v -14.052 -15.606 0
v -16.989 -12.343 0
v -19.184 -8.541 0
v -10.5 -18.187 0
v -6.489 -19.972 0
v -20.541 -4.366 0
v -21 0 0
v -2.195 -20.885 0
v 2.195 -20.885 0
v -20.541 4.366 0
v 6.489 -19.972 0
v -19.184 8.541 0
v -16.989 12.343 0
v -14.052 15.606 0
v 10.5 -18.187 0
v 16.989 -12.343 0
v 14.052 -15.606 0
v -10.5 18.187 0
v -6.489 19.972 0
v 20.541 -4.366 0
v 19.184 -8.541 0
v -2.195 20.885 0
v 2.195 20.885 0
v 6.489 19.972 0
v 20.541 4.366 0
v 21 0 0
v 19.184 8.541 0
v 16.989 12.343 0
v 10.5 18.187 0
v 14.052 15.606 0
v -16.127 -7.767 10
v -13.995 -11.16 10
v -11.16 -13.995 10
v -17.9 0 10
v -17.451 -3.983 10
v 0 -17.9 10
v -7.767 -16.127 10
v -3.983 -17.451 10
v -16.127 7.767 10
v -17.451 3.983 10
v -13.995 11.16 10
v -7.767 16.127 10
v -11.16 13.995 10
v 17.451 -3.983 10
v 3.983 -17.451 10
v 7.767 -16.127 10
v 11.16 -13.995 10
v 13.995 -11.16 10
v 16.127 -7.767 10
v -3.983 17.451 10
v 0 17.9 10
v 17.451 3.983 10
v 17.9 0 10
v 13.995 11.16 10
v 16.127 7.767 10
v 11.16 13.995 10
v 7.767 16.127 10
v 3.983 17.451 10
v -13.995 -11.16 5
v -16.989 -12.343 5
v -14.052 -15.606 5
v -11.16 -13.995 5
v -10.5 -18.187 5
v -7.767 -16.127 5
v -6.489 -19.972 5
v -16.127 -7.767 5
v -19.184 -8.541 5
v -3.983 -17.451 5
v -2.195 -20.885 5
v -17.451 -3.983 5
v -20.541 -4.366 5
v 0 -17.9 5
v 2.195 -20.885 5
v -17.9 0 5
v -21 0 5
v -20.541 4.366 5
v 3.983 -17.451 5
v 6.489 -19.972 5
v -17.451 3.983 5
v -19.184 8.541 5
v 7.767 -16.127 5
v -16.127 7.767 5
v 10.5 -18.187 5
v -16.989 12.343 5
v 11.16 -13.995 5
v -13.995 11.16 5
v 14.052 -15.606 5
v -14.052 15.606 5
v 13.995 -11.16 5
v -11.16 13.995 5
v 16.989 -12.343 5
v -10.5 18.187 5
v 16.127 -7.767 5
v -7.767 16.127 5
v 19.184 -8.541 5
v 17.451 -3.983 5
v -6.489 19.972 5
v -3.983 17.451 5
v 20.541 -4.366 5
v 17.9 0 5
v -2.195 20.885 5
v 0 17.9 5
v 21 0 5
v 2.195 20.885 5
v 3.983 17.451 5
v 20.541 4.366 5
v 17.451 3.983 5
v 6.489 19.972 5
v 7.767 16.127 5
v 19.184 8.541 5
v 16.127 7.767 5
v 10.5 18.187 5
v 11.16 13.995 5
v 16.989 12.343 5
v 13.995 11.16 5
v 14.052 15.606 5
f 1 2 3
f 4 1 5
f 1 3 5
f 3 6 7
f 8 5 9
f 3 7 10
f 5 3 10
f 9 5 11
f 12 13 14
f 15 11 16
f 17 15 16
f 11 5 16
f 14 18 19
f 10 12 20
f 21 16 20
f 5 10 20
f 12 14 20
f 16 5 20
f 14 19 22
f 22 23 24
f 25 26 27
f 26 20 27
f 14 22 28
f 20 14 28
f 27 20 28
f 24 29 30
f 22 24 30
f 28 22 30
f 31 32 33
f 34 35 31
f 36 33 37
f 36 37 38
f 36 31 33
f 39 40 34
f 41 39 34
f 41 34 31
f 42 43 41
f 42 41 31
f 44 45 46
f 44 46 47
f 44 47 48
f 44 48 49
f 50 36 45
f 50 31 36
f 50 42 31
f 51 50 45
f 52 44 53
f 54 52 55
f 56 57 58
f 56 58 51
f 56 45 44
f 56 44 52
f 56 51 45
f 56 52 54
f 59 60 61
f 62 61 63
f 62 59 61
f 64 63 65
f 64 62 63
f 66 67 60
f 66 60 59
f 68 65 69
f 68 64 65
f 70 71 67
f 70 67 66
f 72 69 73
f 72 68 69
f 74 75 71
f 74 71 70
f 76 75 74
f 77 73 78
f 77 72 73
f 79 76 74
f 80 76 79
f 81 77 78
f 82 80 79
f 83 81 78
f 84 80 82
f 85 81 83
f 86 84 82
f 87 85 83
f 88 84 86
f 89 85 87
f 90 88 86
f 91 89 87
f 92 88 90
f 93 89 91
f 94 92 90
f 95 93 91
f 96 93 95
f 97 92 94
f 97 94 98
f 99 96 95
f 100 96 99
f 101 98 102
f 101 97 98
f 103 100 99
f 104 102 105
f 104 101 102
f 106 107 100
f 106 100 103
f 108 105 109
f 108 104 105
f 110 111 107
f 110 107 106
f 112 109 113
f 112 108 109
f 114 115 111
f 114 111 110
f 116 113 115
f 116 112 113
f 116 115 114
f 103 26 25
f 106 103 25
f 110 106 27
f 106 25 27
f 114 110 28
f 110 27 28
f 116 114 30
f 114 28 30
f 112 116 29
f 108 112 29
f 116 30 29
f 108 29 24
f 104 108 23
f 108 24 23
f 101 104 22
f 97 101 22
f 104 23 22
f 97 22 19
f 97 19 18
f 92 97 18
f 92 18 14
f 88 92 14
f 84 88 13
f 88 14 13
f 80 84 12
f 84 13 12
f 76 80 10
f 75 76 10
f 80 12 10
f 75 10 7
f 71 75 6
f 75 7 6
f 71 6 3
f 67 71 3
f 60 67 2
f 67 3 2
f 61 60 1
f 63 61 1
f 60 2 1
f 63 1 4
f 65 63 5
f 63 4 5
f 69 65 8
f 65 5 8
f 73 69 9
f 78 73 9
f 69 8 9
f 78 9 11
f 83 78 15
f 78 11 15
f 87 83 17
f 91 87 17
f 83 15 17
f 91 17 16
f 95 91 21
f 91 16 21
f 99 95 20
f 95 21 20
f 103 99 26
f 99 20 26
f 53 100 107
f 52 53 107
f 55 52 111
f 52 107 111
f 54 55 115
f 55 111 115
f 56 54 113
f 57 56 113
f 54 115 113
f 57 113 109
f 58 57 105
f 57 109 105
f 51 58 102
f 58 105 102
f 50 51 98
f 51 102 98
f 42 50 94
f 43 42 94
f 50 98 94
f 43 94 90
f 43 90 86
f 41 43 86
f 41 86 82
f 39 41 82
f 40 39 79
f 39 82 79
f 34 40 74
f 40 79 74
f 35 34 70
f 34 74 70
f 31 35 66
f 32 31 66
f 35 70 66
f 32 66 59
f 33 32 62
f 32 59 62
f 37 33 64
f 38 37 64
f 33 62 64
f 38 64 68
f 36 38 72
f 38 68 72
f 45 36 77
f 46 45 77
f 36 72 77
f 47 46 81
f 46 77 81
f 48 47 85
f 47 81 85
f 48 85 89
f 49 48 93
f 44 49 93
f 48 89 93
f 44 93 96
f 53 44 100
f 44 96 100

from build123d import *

# Parameters (mm, degrees)
F0_R       = 21
F0_R_2     = 17.9
F1_DEPTH   = 5
F2_R       = 17.9
F3_DEPTH   = 5
F6_R       = 10
F7_DEPTH   = 25
F4_R       = 20
F7_FACE_R  = 10
F7_FACE1_R = 10


with BuildPart() as f1:
    # F0 (on Top) → F1 (new body)
    with BuildSketch(Plane.XY):
        Circle(F0_R)
        Circle(F0_R_2, mode=Mode.SUBTRACT)
        Circle(F0_R_2)
    extrude(amount=F1_DEPTH)

    # F2 (on face) → F3 (join)
    with BuildSketch(Plane.XY.offset(5)):
        Circle(F2_R)
    extrude(amount=F3_DEPTH)


with BuildPart() as f7:
    # F6 (on offset) → F7 (new body)
    with BuildSketch(Plane(origin=(0, 0, -25), x_dir=(1, 0, 0), z_dir=(0, 0, -1))):
        Circle(F6_R)
    extrude(amount=F7_DEPTH)

    # F10: sweep along a path in F9
    with BuildLine(Plane.XZ) as f10_path:
        Line((0, -50), (0, -58.9215382934))
        add(Plane.XZ * Edge.make_bspline(
            [(0, -58.9215382934), (0.244972108, -61.8164338234), (0.7711153536, -68.033997701), (-4.6363235106, -79.4328354028), (-19.6589254166, -90.9882543348), (-29.0378853679, -98.2025712729)],
            knots=[0, 0, 0, 0, 0.2465968941, 0.529632909, 1, 1, 1, 1], degree=3))
    # F7_face1 (on face) → F10 (sweep)
    with BuildSketch(Plane(origin=(0, 0, -50), x_dir=(1, 0, 0), z_dir=(0, 0, -1))):
        Circle(F7_FACE1_R)
    sweep(path=f10_path.line, transition=Transition.RIGHT)


with BuildPart() as f8:
    # F4 (on face) → F8 section 0
    with BuildSketch(Plane(origin=(0, 0, 0), x_dir=(1, 0, 0), z_dir=(0, 0, -1))):
        Circle(F4_R)
    # F7_face (on face) → F8 section 1
    with BuildSketch(Plane.XY.offset(-25)):
        Circle(F7_FACE_R)
    loft()


solid = f1.part
